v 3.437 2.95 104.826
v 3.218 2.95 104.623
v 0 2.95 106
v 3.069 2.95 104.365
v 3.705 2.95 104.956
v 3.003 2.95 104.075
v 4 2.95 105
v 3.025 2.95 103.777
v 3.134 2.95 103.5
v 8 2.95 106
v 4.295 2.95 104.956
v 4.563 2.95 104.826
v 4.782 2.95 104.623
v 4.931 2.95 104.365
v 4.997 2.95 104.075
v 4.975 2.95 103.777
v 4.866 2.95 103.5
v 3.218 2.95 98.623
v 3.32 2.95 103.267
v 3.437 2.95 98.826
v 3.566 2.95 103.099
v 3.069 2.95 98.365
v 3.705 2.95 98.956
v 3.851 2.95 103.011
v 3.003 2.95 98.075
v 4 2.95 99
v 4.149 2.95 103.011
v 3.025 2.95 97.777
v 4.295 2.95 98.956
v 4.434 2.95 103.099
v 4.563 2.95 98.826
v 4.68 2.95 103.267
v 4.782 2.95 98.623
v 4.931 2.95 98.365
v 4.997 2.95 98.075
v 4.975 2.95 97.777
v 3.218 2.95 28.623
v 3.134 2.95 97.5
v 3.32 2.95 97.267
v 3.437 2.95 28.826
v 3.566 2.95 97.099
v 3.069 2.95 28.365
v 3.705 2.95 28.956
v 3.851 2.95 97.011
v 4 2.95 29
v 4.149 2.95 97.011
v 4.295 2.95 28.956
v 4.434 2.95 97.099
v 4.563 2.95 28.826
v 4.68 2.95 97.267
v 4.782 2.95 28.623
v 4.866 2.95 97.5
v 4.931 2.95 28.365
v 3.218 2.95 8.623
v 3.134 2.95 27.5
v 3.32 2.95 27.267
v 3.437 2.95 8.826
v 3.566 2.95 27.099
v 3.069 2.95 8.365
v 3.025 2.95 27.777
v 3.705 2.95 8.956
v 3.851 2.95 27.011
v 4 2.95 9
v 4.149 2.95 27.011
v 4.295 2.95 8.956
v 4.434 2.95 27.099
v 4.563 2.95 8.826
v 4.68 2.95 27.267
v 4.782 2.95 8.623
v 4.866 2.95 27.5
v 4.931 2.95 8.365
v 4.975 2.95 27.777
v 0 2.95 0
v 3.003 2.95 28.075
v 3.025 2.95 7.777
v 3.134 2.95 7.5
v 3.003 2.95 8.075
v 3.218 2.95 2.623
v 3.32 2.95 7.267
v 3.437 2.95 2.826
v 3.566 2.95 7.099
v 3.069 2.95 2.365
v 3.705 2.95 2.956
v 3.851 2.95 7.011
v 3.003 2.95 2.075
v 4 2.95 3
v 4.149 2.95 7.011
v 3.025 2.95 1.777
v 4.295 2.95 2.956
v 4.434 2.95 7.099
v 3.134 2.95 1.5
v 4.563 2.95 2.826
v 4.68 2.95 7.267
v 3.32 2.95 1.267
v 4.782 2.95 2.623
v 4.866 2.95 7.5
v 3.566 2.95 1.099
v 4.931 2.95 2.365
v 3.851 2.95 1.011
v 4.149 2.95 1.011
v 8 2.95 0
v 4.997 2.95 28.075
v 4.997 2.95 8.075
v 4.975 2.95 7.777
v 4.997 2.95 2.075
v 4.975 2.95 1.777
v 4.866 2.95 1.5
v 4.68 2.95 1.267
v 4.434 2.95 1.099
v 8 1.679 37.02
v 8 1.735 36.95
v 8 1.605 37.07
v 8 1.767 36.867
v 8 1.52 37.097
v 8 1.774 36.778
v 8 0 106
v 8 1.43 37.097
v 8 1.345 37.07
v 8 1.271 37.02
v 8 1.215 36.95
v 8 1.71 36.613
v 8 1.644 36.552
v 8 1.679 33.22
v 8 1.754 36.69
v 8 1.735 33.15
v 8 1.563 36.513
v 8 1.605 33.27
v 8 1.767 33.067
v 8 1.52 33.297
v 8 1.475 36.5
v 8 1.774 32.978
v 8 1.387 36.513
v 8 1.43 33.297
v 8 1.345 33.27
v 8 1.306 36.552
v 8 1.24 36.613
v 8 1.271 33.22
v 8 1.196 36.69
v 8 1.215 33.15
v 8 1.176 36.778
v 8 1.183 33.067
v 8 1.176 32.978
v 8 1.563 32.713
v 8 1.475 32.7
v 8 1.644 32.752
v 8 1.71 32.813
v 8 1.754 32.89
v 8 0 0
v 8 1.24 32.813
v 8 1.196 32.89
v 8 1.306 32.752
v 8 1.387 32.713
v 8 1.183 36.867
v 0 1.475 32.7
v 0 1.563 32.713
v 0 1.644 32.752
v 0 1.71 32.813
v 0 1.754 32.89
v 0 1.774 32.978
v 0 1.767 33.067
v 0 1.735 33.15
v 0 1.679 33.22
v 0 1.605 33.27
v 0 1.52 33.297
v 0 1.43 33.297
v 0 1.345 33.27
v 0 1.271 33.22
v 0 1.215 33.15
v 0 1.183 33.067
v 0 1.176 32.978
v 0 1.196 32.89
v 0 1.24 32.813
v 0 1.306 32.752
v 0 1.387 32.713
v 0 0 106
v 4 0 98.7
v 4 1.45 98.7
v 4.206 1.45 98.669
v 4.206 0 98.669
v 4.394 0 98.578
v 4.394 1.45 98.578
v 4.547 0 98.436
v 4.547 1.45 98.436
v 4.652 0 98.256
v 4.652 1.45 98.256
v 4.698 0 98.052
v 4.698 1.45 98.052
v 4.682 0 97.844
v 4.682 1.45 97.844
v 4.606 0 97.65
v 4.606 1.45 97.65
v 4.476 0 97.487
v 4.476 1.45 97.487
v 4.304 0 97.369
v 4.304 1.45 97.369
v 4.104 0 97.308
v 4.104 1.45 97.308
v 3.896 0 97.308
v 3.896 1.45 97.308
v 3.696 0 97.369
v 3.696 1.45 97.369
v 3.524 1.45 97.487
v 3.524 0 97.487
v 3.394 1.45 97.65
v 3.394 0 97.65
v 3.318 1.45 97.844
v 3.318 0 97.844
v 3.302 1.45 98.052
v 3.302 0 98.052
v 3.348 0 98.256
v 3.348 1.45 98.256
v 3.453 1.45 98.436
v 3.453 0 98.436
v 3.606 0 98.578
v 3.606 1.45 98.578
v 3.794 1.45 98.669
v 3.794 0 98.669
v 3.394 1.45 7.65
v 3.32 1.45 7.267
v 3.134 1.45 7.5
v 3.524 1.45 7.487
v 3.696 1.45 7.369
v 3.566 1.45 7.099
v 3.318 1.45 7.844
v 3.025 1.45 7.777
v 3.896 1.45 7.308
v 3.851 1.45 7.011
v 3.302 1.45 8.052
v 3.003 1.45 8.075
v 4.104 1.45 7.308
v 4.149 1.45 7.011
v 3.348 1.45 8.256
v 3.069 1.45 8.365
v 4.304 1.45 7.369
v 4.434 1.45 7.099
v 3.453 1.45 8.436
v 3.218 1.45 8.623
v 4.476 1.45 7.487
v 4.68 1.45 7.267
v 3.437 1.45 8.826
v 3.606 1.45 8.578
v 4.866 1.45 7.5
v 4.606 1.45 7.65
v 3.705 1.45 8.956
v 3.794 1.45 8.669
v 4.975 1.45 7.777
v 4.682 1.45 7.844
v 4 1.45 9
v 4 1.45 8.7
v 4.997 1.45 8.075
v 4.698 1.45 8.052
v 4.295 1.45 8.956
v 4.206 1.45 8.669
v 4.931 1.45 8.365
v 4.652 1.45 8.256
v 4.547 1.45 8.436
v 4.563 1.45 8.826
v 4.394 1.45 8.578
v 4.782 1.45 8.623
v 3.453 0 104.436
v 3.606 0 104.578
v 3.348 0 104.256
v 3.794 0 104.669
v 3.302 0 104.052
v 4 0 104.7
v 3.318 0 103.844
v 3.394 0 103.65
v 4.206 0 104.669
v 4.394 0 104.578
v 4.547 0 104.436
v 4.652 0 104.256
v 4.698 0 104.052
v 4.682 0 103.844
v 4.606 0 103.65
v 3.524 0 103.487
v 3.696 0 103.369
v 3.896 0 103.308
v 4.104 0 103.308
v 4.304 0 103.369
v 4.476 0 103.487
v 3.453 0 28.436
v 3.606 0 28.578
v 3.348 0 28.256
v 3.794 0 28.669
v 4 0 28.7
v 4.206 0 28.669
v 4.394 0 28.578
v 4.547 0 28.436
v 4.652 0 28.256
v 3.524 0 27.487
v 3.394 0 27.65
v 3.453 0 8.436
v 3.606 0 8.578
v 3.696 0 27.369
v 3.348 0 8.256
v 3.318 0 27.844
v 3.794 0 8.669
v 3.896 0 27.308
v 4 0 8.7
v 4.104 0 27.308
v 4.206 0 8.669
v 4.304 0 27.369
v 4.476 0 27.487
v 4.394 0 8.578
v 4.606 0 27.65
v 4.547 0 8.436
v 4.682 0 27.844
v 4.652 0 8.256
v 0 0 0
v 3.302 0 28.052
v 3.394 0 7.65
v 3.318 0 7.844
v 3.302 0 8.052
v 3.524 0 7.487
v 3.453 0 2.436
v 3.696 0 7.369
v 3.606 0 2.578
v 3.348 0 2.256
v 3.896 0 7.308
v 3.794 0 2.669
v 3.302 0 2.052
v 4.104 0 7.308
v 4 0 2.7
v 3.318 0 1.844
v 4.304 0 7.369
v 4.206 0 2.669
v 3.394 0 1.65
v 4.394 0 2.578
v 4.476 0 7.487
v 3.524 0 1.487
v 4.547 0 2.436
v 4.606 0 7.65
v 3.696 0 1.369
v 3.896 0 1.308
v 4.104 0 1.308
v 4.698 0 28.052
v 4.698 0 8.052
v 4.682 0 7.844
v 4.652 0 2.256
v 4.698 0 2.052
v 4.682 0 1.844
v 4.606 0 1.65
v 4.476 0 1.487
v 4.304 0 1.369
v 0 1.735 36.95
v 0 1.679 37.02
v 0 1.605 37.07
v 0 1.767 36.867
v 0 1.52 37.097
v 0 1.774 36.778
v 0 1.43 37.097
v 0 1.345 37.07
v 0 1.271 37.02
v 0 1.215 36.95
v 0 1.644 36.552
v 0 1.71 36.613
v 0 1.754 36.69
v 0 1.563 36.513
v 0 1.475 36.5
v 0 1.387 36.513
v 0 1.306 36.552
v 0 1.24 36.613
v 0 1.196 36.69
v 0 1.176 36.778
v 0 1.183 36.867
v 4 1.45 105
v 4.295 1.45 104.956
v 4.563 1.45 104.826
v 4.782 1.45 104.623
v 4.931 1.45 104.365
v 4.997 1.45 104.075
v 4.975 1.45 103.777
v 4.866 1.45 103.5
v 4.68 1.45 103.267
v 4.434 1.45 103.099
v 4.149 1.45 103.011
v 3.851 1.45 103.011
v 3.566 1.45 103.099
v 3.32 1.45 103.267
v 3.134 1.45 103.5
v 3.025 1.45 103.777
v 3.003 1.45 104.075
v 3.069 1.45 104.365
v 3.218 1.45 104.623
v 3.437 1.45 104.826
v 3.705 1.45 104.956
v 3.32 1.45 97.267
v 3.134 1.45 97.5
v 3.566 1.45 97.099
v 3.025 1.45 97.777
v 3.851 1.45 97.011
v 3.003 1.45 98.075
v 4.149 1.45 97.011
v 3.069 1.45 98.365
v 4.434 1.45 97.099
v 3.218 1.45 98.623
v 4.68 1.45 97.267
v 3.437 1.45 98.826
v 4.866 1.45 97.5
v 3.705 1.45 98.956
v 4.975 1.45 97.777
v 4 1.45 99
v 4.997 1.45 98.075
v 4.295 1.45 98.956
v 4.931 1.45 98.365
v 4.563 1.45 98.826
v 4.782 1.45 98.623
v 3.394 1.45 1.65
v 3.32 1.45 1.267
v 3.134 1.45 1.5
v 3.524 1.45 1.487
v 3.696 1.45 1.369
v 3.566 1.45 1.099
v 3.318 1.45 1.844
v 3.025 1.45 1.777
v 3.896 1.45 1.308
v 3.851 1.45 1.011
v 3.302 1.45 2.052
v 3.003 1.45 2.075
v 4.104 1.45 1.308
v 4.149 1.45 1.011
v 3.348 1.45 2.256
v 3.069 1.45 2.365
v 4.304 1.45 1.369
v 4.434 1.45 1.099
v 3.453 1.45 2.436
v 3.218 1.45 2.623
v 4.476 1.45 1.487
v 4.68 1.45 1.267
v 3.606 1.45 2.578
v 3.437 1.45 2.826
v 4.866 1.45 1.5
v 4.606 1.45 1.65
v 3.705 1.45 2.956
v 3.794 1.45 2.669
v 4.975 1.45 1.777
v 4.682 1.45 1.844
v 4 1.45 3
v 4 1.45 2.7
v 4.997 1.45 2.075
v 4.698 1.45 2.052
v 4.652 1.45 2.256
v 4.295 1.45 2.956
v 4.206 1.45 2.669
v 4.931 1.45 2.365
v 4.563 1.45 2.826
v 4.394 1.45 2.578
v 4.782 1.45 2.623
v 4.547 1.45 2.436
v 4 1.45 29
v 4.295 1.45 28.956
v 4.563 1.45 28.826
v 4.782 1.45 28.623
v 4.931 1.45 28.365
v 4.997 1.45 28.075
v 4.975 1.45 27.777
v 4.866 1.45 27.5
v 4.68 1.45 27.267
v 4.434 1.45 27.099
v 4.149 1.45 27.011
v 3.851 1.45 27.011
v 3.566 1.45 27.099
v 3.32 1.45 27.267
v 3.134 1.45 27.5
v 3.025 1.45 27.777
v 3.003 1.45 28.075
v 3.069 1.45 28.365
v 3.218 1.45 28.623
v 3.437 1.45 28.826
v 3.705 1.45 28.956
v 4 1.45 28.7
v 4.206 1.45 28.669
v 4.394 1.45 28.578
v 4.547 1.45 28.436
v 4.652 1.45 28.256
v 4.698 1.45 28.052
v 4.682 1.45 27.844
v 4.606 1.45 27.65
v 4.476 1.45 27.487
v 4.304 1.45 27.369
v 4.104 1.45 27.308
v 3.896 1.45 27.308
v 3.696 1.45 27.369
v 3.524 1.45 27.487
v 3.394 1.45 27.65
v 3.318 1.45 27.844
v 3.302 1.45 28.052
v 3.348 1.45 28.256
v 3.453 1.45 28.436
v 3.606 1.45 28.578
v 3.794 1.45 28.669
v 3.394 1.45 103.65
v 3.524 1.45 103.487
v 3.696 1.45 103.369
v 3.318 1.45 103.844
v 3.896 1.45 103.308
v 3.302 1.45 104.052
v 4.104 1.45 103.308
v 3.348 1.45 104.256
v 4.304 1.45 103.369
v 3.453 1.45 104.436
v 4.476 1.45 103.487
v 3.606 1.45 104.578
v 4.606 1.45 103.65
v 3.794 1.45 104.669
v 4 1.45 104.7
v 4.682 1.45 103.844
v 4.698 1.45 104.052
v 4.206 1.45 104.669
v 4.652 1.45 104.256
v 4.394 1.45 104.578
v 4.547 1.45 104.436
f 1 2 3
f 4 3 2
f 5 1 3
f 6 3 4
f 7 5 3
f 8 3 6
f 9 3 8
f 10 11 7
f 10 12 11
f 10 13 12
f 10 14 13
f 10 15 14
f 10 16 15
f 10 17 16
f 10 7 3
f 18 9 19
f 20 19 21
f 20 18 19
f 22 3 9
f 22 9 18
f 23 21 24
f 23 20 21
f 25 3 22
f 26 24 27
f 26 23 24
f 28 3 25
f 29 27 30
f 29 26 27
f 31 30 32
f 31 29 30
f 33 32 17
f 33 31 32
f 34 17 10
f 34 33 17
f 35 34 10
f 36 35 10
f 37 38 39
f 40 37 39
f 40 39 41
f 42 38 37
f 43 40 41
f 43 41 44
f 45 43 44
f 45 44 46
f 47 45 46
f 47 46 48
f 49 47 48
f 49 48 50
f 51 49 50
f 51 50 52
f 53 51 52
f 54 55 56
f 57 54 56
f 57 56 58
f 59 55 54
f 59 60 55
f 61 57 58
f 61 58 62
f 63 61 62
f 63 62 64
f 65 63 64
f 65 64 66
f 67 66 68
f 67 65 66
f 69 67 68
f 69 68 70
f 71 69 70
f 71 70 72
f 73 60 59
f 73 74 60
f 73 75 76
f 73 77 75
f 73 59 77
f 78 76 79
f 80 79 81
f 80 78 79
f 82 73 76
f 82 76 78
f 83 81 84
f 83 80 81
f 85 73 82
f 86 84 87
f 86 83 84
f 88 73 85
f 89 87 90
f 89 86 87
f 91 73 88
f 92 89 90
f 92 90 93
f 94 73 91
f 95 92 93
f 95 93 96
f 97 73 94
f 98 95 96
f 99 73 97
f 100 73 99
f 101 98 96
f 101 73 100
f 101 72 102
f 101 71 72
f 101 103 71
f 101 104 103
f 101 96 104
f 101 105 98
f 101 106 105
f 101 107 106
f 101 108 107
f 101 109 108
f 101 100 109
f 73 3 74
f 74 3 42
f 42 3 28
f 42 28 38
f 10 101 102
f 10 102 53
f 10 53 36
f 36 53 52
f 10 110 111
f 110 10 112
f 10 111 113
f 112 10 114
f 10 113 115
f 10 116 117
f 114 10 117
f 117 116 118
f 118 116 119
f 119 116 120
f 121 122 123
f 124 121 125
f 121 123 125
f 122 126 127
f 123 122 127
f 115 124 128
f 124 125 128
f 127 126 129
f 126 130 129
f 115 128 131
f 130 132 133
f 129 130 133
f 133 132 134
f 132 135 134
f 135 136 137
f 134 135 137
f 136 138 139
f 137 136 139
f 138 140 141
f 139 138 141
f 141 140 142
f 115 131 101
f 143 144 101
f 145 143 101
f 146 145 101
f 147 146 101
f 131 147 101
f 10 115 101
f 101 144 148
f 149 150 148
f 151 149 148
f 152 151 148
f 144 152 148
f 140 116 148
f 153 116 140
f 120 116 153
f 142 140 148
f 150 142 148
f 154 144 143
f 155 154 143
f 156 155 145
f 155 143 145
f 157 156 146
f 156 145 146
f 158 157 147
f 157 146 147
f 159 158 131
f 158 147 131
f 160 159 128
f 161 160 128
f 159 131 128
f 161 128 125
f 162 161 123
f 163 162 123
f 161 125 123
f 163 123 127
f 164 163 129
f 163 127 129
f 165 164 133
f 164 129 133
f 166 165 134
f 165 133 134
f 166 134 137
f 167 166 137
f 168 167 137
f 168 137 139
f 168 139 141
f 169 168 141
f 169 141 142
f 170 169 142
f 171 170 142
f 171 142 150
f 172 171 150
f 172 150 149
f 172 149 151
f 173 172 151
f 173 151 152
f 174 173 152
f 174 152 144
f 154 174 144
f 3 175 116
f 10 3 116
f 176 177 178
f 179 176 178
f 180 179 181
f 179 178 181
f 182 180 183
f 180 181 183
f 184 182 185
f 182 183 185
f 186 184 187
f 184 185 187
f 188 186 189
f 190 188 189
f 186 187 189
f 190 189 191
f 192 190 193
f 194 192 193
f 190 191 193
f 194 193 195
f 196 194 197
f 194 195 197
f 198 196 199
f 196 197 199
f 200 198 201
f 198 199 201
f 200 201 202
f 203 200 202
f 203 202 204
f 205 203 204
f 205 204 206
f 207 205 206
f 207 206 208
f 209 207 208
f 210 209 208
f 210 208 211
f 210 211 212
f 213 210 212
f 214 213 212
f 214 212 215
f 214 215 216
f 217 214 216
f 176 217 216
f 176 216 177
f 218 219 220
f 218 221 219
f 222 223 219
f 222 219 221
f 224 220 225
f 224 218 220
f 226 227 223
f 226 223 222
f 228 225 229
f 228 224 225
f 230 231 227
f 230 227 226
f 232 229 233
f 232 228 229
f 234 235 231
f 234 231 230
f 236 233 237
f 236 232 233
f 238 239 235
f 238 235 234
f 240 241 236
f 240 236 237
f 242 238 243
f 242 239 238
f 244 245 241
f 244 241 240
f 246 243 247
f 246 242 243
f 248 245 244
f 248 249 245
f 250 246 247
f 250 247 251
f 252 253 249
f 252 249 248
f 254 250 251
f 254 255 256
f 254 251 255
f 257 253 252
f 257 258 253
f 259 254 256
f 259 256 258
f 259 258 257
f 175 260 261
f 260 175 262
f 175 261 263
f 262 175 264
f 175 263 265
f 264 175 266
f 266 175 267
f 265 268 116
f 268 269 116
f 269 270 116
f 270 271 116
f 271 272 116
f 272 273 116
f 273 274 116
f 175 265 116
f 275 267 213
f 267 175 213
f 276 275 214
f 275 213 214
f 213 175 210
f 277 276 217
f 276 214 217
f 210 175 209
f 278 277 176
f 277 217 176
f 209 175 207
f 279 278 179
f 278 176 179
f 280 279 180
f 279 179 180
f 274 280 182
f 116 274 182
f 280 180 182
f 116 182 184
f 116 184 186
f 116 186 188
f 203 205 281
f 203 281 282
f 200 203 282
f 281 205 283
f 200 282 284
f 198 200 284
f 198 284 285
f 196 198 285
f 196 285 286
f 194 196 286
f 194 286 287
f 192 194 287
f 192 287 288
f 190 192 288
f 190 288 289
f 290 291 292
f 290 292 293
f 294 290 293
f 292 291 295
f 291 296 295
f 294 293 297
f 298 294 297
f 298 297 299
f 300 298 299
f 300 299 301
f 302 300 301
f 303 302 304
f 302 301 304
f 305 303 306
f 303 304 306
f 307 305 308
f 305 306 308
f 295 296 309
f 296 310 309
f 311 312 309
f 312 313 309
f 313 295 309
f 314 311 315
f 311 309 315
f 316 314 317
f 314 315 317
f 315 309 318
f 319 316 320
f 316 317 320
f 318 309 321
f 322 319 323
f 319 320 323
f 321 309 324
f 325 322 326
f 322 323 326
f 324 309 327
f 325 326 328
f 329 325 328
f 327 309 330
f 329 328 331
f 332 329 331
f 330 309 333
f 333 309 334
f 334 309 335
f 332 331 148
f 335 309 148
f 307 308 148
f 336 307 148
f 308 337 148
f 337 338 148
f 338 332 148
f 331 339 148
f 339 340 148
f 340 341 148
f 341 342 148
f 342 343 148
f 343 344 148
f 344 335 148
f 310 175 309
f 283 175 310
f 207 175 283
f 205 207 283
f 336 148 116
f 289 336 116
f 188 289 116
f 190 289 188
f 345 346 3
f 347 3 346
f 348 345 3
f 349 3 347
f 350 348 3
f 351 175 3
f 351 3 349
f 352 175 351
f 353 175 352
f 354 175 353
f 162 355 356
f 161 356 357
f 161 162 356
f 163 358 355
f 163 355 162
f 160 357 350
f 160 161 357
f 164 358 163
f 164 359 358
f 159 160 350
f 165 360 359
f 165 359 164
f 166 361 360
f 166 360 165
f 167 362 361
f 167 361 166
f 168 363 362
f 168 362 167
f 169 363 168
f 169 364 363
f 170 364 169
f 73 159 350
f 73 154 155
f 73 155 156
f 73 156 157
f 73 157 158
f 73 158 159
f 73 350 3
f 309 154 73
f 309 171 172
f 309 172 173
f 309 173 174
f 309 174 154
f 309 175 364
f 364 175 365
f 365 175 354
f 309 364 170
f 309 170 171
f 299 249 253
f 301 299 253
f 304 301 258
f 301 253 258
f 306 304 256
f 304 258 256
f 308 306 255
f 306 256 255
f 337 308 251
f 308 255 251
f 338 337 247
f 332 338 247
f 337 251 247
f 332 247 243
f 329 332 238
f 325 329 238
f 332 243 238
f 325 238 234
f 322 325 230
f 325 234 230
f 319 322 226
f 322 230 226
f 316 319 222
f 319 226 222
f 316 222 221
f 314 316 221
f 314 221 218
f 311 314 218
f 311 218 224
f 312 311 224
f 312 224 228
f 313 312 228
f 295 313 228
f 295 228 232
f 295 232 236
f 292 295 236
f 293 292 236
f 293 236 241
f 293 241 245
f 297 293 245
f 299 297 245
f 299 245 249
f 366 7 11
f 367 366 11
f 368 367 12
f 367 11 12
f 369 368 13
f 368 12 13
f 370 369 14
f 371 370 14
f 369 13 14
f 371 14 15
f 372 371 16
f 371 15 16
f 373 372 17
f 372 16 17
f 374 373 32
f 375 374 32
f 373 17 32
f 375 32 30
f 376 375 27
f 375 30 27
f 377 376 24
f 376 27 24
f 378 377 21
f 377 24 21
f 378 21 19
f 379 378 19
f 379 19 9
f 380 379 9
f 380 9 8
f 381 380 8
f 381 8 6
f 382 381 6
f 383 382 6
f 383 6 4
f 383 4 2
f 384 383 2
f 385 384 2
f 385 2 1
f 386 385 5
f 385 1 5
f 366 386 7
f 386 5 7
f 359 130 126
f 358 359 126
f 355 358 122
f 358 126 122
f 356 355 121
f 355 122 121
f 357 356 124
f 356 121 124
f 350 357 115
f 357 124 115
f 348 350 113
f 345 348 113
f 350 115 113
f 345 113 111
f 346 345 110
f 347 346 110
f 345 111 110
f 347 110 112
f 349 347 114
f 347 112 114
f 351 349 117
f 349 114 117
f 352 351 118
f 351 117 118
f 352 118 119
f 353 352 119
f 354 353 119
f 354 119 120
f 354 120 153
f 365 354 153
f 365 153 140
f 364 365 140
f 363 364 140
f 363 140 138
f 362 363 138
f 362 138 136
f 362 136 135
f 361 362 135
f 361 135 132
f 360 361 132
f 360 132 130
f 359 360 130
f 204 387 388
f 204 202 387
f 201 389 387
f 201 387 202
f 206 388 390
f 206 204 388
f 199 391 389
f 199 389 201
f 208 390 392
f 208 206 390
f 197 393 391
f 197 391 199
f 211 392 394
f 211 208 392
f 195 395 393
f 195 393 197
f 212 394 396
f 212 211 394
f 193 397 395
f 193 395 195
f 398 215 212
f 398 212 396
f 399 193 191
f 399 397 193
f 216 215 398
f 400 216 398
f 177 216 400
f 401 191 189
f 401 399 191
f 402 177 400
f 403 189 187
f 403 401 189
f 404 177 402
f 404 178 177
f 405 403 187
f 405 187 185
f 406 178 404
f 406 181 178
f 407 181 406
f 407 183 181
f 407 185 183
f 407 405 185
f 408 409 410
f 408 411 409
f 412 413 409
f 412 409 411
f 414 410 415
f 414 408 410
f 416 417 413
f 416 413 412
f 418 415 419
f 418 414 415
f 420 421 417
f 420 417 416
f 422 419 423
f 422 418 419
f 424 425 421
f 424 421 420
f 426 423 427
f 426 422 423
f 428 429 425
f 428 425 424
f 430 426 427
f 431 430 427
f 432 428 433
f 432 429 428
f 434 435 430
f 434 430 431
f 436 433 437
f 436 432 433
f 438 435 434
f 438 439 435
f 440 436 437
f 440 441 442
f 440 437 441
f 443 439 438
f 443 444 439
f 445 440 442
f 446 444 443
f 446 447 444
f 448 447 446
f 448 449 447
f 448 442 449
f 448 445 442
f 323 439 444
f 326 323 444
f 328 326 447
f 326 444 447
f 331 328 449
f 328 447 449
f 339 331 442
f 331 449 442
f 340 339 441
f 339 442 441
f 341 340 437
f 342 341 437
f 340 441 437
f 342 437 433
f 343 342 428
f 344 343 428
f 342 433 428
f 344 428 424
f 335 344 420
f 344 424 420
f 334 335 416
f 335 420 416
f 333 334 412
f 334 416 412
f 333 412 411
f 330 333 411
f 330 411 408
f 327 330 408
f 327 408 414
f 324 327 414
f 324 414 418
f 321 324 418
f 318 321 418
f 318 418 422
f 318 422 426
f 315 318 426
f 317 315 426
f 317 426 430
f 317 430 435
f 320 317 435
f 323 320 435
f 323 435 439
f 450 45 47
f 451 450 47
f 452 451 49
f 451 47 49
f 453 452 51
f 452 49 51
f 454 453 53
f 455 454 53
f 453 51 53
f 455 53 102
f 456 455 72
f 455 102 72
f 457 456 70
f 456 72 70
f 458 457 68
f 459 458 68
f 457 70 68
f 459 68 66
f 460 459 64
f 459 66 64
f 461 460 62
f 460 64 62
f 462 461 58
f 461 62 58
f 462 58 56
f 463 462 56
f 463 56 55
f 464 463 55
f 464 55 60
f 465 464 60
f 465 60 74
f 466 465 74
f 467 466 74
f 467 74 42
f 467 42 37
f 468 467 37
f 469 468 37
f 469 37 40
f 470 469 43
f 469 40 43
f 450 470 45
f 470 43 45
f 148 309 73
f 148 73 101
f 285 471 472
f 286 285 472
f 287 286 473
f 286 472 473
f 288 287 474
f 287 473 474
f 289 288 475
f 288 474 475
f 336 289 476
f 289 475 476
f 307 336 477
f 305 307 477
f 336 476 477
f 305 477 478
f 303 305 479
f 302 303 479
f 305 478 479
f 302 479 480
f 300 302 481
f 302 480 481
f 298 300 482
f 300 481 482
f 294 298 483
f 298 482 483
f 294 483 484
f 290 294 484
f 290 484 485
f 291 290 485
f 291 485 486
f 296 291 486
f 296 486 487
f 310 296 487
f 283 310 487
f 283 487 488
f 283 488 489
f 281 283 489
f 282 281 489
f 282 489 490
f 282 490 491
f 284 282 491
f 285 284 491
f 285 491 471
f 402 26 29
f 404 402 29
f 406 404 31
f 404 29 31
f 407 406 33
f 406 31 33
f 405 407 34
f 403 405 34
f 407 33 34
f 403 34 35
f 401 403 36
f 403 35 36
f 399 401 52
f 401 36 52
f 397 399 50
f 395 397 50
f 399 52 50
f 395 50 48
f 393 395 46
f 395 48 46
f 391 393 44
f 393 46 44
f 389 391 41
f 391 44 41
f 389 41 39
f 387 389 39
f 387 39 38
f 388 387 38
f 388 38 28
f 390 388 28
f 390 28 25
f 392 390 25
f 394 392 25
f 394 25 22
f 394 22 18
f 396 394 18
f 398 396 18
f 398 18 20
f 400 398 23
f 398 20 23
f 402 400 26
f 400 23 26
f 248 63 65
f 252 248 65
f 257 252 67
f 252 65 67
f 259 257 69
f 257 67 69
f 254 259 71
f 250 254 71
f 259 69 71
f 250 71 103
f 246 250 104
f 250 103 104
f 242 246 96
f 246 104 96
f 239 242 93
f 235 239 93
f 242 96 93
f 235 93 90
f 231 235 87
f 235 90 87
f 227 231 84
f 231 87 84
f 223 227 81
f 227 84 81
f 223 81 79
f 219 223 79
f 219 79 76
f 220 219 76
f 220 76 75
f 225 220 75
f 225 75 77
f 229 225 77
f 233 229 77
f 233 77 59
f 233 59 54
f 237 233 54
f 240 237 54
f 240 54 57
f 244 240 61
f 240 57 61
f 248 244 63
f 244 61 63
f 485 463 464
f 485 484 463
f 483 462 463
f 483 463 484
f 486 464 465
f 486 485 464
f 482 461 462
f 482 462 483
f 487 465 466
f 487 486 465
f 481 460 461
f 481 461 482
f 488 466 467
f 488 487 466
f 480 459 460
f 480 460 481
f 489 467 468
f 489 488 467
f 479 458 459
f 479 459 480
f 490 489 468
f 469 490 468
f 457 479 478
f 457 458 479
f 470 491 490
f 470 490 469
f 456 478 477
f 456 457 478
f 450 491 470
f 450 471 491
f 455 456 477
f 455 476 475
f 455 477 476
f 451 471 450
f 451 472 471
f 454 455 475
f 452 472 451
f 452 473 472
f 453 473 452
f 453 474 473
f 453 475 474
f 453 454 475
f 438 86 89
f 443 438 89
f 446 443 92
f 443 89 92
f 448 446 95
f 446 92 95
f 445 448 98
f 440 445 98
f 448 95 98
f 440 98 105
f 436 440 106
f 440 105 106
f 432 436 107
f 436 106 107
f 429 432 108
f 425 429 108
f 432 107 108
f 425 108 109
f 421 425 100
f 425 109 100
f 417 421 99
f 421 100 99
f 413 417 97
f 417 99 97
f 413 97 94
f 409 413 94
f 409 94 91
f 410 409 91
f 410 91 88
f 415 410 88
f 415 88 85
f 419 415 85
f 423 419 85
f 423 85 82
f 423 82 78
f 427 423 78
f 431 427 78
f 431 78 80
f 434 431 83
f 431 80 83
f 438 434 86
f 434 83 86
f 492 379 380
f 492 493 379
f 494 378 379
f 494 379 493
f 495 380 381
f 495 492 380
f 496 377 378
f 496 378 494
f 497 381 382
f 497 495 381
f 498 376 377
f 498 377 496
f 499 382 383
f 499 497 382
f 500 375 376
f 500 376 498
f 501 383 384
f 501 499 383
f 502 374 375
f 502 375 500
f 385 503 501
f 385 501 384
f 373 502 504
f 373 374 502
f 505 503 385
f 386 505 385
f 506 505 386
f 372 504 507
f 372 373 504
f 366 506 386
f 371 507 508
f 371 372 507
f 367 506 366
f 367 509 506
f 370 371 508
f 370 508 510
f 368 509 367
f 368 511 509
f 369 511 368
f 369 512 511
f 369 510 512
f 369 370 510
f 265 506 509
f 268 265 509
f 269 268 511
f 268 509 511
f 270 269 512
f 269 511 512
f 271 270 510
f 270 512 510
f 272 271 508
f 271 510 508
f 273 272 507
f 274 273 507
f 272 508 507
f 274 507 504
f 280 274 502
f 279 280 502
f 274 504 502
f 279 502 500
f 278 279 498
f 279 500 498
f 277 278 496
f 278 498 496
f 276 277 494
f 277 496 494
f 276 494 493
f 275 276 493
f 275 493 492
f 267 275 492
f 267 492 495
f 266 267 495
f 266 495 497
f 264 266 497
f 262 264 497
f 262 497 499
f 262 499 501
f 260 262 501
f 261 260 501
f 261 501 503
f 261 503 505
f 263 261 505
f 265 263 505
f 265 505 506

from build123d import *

# Parameters (mm, degrees)
SKETCH_1_W          = 8
SKETCH_1_H          = 106
EXTRUDE_1_DEPTH     = 2.95
SKETCH_2_R          = 0.7
CUT_EXTRUDE_1_DEPTH = 107.342383366
SKETCH_2_3_R        = 1
CUT_EXTRUDE_2_DEPTH = 1.5
SKETCH_3_R          = 0.3
CUT_EXTRUDE_3_DEPTH = 107.342383366


with BuildPart() as part:
    # 草图1 → 凸台-拉伸1 (new body)
    with BuildSketch(Plane(origin=(0, 0, 0), x_dir=(1, 0, 0), z_dir=(0, 1, 0))):
        with Locations((4, -53)):
            Rectangle(SKETCH_1_W, SKETCH_1_H)
    extrude(amount=EXTRUDE_1_DEPTH)

    # 草图2 → 切除-拉伸1 (cut, through all)
    with BuildSketch(Plane(origin=(0, 2.95, 0), x_dir=(1, 0, 0), z_dir=(0, 1, 0))):
        with Locations((4, -8)):
            Circle(SKETCH_2_R)
        with Locations((4, -2)):
            Circle(SKETCH_2_R)
        with Locations((4, -104)):
            Circle(SKETCH_2_R)
        with Locations((4, -98)):
            Circle(SKETCH_2_R)
        with Locations((4, -28)):
            Circle(SKETCH_2_R)
    extrude(amount=-CUT_EXTRUDE_1_DEPTH, mode=Mode.SUBTRACT)

    # 草图2<3> → 切除-拉伸2 (cut)
    with BuildSketch(Plane(origin=(0, 2.95, 0), x_dir=(1, 0, 0), z_dir=(0, 1, 0))):
        with Locations((4, -8)):
            Circle(SKETCH_2_3_R)
        with Locations((4, -2)):
            Circle(SKETCH_2_3_R)
        with Locations((4, -104)):
            Circle(SKETCH_2_3_R)
        with Locations((4, -98)):
            Circle(SKETCH_2_3_R)
        with Locations((4, -28)):
            Circle(SKETCH_2_3_R)
    extrude(amount=-CUT_EXTRUDE_2_DEPTH, mode=Mode.SUBTRACT)

    # 草图3 → 切除-拉伸3 (cut, through all)
    with BuildSketch(Plane(origin=(8, 0, 0), x_dir=(0, 0, -1), z_dir=(1, 0, 0))):
        with Locations((-33, 1.475)):
            Circle(SKETCH_3_R)
        with Locations((-36.8, 1.475)):
            Circle(SKETCH_3_R)
    extrude(amount=-CUT_EXTRUDE_3_DEPTH, mode=Mode.SUBTRACT)


solid = part.part
